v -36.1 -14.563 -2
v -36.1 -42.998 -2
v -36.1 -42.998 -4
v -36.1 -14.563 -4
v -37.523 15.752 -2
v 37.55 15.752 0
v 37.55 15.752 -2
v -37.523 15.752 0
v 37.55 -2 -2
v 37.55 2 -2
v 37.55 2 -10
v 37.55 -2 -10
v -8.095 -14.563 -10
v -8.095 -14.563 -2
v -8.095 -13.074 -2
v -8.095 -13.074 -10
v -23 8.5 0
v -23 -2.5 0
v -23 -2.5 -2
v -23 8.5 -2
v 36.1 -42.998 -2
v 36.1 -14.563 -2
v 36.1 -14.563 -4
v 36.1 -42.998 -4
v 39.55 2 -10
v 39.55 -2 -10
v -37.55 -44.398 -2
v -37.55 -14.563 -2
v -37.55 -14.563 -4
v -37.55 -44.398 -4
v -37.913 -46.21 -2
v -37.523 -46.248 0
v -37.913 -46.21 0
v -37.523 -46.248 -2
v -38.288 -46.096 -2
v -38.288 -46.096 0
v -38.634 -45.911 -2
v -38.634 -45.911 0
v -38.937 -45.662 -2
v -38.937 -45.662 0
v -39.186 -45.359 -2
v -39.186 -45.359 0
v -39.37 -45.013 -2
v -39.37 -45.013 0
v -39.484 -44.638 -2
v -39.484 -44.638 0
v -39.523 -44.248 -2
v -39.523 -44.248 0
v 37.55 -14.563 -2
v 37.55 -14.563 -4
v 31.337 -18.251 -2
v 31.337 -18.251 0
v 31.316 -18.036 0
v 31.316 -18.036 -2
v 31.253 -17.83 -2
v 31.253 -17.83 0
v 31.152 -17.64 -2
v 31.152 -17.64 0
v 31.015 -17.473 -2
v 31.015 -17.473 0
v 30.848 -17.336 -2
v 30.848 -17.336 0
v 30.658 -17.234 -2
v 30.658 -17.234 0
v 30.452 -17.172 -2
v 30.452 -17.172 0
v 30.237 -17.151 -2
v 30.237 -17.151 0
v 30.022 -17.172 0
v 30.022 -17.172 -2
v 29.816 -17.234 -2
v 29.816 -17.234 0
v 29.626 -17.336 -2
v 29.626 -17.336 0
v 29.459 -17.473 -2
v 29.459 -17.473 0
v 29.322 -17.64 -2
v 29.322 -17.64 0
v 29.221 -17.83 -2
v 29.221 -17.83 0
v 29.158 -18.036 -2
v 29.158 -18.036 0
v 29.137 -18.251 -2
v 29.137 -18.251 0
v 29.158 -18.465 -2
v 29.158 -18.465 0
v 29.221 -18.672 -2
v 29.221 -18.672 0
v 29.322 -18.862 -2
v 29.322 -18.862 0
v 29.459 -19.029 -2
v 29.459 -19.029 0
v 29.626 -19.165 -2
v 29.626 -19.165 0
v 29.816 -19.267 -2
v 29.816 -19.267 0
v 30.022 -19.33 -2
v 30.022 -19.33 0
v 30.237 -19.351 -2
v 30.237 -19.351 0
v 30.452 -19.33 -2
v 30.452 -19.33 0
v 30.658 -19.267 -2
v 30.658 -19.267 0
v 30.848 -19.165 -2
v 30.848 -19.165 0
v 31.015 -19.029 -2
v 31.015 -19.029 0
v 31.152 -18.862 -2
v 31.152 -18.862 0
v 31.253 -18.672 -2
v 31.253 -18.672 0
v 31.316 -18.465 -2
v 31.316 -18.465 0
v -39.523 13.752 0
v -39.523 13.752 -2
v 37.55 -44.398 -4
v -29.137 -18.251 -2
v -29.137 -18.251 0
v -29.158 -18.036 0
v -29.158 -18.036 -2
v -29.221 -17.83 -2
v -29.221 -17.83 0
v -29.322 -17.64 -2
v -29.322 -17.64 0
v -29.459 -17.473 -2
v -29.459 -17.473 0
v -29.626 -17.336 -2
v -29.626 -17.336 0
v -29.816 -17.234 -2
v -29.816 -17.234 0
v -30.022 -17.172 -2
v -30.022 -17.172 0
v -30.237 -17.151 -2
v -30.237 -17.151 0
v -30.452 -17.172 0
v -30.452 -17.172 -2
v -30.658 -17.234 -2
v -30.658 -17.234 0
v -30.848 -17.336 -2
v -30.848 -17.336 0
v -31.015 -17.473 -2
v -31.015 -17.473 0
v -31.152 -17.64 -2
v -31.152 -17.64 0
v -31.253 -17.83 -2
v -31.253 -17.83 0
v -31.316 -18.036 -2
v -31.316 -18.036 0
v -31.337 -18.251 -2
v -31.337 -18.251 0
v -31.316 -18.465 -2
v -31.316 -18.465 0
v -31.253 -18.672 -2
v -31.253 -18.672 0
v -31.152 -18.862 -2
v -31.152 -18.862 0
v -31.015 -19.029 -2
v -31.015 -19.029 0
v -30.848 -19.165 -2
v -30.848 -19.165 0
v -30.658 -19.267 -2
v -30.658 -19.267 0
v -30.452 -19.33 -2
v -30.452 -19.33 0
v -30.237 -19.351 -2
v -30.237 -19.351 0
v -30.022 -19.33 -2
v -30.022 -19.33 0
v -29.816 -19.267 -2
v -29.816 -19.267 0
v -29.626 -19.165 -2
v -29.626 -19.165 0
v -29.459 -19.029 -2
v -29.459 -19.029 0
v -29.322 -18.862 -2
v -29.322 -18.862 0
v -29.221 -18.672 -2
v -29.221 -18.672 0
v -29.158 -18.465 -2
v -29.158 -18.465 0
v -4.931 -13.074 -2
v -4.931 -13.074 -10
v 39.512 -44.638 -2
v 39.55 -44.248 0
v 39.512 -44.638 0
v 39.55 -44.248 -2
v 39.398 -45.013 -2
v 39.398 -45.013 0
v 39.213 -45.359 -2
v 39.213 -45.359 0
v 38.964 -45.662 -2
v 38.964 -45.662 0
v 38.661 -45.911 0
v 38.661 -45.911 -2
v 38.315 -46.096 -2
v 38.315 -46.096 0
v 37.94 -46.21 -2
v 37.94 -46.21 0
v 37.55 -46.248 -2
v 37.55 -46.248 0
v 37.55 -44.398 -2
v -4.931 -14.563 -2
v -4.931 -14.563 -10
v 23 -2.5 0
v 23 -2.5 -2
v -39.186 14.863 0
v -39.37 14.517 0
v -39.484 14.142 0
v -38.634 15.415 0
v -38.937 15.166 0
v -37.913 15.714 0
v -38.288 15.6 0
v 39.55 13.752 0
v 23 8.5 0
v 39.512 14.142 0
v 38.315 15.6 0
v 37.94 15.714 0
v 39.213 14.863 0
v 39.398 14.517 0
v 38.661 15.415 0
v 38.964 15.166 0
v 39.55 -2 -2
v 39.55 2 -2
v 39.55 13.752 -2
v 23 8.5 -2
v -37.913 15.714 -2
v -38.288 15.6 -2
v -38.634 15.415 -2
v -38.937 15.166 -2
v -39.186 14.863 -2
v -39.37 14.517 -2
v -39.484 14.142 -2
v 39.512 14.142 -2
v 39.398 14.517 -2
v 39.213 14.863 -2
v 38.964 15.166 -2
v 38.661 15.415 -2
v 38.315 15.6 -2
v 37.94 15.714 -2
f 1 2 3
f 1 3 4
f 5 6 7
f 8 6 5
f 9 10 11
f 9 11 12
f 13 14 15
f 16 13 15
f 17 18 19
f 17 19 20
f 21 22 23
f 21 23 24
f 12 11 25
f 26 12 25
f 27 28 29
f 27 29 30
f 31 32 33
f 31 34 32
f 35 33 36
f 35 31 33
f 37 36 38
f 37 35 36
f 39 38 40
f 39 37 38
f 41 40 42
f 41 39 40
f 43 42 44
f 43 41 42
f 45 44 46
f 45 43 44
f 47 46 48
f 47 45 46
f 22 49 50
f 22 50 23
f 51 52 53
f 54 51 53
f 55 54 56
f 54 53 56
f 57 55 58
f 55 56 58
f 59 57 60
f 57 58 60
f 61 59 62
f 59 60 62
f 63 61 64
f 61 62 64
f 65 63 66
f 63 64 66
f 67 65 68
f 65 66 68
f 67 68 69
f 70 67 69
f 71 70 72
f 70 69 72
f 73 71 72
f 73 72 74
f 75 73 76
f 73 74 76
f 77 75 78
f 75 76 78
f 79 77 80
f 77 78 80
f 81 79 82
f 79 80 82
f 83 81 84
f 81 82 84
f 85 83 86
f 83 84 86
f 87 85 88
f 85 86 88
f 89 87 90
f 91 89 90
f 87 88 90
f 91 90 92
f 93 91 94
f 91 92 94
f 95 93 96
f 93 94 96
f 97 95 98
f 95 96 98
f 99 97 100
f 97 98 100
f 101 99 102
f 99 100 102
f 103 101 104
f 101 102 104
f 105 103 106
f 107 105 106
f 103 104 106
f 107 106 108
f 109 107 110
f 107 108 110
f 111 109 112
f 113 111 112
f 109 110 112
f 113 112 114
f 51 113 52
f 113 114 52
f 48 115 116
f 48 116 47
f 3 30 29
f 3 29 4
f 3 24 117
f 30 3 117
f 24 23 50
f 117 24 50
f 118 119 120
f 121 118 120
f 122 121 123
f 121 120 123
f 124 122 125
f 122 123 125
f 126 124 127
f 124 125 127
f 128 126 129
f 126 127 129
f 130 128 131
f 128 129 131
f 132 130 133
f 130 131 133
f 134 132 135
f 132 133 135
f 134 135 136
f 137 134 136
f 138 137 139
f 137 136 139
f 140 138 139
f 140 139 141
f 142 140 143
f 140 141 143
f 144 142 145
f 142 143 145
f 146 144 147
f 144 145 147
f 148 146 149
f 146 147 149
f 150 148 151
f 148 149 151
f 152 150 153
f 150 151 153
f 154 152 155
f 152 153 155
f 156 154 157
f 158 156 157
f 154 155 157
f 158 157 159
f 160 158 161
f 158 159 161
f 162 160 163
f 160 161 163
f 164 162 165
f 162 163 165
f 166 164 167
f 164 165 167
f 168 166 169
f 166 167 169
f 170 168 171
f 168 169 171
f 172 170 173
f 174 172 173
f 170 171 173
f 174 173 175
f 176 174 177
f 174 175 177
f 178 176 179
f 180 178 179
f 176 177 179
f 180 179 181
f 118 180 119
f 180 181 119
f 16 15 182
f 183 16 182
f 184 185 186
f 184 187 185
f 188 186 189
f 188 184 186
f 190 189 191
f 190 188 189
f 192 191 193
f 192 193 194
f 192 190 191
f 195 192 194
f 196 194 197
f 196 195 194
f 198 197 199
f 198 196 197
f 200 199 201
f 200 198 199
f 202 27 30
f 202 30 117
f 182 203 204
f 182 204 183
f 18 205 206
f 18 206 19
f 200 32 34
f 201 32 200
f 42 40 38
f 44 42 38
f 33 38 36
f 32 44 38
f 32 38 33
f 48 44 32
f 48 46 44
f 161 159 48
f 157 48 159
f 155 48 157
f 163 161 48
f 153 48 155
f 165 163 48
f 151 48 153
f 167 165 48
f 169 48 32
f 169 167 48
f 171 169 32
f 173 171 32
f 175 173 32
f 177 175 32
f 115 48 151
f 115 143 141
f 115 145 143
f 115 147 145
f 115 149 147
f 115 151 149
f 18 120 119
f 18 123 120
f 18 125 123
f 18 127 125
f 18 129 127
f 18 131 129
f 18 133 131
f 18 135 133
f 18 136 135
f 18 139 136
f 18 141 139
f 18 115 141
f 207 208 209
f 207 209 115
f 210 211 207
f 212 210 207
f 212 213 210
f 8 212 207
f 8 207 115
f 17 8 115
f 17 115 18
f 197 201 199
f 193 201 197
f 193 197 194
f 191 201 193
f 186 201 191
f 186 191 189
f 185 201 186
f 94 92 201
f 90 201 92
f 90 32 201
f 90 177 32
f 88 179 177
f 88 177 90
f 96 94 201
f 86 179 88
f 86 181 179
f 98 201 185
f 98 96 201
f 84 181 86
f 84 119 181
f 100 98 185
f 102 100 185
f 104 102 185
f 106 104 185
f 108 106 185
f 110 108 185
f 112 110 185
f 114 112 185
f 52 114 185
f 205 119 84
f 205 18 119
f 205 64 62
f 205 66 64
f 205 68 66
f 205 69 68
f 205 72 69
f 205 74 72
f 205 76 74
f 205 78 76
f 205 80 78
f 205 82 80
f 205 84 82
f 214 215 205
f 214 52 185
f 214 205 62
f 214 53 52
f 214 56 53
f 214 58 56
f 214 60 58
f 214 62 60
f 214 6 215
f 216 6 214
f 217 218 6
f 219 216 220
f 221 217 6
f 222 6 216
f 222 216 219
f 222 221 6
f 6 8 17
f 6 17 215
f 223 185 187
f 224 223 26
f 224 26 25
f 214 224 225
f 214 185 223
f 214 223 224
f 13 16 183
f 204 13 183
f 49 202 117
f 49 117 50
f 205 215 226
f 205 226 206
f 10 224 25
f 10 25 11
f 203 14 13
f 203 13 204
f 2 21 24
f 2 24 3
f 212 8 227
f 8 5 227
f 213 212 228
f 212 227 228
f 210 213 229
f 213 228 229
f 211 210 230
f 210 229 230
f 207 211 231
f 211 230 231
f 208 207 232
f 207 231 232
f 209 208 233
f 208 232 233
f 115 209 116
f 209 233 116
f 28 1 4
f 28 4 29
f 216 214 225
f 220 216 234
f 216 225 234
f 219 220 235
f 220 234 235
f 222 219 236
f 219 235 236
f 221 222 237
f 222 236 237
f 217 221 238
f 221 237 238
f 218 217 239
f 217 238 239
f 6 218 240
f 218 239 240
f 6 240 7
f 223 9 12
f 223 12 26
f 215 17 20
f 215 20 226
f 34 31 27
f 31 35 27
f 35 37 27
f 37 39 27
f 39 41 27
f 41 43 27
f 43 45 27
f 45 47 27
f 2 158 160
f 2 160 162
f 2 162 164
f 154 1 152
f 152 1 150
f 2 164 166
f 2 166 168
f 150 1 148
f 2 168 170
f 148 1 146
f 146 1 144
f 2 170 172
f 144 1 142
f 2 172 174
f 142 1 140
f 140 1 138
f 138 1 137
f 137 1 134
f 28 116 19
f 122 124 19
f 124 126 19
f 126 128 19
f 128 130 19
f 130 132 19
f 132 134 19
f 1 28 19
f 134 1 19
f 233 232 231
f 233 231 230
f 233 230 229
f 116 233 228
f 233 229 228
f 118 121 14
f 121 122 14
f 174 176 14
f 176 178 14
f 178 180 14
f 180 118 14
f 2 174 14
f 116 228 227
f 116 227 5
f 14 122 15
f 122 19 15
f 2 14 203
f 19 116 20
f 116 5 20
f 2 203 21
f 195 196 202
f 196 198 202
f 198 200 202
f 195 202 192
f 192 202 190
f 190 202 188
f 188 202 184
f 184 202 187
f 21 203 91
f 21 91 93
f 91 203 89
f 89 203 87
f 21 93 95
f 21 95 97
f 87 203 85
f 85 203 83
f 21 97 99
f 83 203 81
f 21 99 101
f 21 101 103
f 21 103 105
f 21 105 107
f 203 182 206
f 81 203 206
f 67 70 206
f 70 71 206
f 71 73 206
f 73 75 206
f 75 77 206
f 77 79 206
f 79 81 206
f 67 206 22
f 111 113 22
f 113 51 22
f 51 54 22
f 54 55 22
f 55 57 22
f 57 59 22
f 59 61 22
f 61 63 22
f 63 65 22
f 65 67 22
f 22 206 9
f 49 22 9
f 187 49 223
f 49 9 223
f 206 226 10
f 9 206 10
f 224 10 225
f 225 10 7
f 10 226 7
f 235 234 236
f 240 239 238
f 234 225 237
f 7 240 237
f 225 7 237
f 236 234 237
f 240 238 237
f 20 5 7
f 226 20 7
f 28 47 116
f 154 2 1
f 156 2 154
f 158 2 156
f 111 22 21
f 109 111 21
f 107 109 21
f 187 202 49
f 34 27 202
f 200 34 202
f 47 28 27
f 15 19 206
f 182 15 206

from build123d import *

# Parameters (mm, degrees)
F1_DEPTH = 2
F0_R     = 3
F0_R_2   = 1.1
F2_DEPTH = 2
F0_W     = 3.1642657705
F0_H     = 1.4890261218
F3_DEPTH = 10
F4_DEPTH = 4
F5_R     = 2


with BuildPart() as f1:
    # F0 (on Top) → F1 (new body)
    with BuildSketch(Plane.XY):
        Polygon((-37.55, -13.0740804598), (-37.55, -12.1), (-37.55, 13.5259195402), (37.55, 13.5259195402), (37.55, 2.0000108369), (39.55, 2.0000108369), (39.55, 15.7519578086), (-39.5226512551, 15.7519578086), (-39.5226512551, -46.2480421914), (39.55, -46.2480421914), (39.55, -1.9999891631), (37.55, -1.9999891631), (37.55, -13.0740804598), (-4.9305087887, -13.0740804598), (-4.9305087887, -14.5631065816), (36.1, -14.5631065816), (37.55, -14.5631065816), (37.55, -44.3981406778), (-37.55, -44.3981406778), (-37.55, -14.5631065816), (-36.1, -14.5631065816), (-8.0947745591, -14.5631065816), (-8.0947745591, -13.0740804598), align=None)
    extrude(amount=-F1_DEPTH)

    # F0 (on Top) → F2 (join)
    with BuildSketch(Plane.XY):
        Polygon((-4.9305087887, -14.5631065816), (-8.0947745591, -14.5631065816), (-36.1, -14.5631065816), (-36.1, -42.9981406778), (36.1, -42.9981406778), (36.1, -14.5631065816), align=None)
        with Locations((-30.2370786667, -18.2506926358)):
            Circle(F0_R, mode=Mode.SUBTRACT)
        with Locations((30.2370786667, -18.2506926358)):
            Circle(F0_R, mode=Mode.SUBTRACT)
        Polygon((-37.55, 13.5259195402), (-37.55, -12.1), (-37.55, -13.0740804598), (-8.0947745591, -13.0740804598), (-4.9305087887, -13.0740804598), (37.55, -13.0740804598), (37.55, -1.9999891631), (37.55, 2.0000108369), (37.55, 13.5259195402), align=None)
        Polygon((36.1, 12.1), (36.1, -12.1), (-36.1, -12.1), (-36.1, 12.1), (-25.6, 12.1), (29.1, 12.1), align=None, mode=Mode.SUBTRACT)
        Polygon((-36.1, -12.1), (36.1, -12.1), (36.1, 12.1), (29.1, 12.1), (-25.6, 12.1), (-36.1, 12.1), align=None)
        with BuildLine():
            ThreePointArc((-23, 0.1033370453), (-28.1971127107, 0.0983324043), (-25.6, 4.6))
            ThreePointArc((-25.6, 4.6), (-24.0983324043, 4.1971127107), (-23, 3.0966629547))
            Line((-23, 3.0966629547), (-23, 8.5))
            Line((-23, 8.5), (0, 8.5))
            Line((0, 8.5), (23, 8.5))
            Line((23, 8.5), (23, -2.5))
            Line((23, -2.5), (-23, -2.5))
            Line((-23, -2.5), (-23, 0.1033370453))
        make_face(mode=Mode.SUBTRACT)
        with BuildLine():
            ThreePointArc((32.1000297599, 2.1), (26.978658613, -0.021341387), (29.1, 5.1000297599))
            ThreePointArc((29.1, 5.1000297599), (31.221341387, 4.221341387), (32.1000297599, 2.1))
        make_face(mode=Mode.SUBTRACT)
        Polygon((-36.1, -42.9981406778), (-36.1, -14.5631065816), (-37.55, -14.5631065816), (-37.55, -44.3981406778), (37.55, -44.3981406778), (37.55, -14.5631065816), (36.1, -14.5631065816), (36.1, -42.9981406778), align=None)
        with BuildLine():
            ThreePointArc((32.1000297599, 2.1), (31.221341387, 4.221341387), (29.1, 5.1000297599))
            ThreePointArc((29.1, 5.1000297599), (26.978658613, -0.021341387), (32.1000297599, 2.1))
        make_face()
        with BuildLine():
            ThreePointArc((30.2, 2.1), (28.3221825407, 1.3221825407), (29.1, 3.2))
            ThreePointArc((29.1, 3.2), (29.8778174593, 2.8778174593), (30.2, 2.1))
        make_face(mode=Mode.SUBTRACT)
        with Locations((30.2370786667, -18.2506926358)):
            Circle(F0_R)
        with Locations((30.2370786667, -18.2506926358)):
            Circle(F0_R_2, mode=Mode.SUBTRACT)
        with Locations((-30.2370786667, -18.2506926358)):
            Circle(F0_R)
        with Locations((-30.2370786667, -18.2506926358)):
            Circle(F0_R_2, mode=Mode.SUBTRACT)
        with BuildLine():
            Line((-25.6, 2.7), (-25.6, 4.6))
            ThreePointArc((-25.6, 4.6), (-28.1971127107, 0.0983324043), (-23, 0.1033370453))
            Line((-23, 0.1033370453), (-23, 1.6))
            Line((-23, 1.6), (-24.5, 1.6))
            ThreePointArc((-24.5, 1.6), (-26.3778174593, 0.8221825407), (-25.6, 2.7))
        make_face()
        with BuildLine():
            ThreePointArc((-23, 3.0966629547), (-24.0983324043, 4.1971127107), (-25.6, 4.6))
            Line((-25.6, 4.6), (-25.6, 2.7))
            ThreePointArc((-25.6, 2.7), (-24.8221825407, 2.3778174593), (-24.5, 1.6))
            Line((-24.5, 1.6), (-23, 1.6))
            Line((-23, 1.6), (-23, 3.0966629547))
        make_face()
        with BuildLine():
            ThreePointArc((30.2, 2.1), (29.8778174593, 2.8778174593), (29.1, 3.2))
            ThreePointArc((29.1, 3.2), (28.3221825407, 1.3221825407), (30.2, 2.1))
        make_face()
        with BuildLine():
            Line((-25.6, 1.6), (-25.6, 2.7))
            ThreePointArc((-25.6, 2.7), (-26.3778174593, 0.8221825407), (-24.5, 1.6))
            Line((-24.5, 1.6), (-25.6, 1.6))
        make_face()
        with BuildLine():
            ThreePointArc((-24.5, 1.6), (-24.8221825407, 2.3778174593), (-25.6, 2.7))
            Line((-25.6, 2.7), (-25.6, 1.6))
            Line((-25.6, 1.6), (-24.5, 1.6))
        make_face()
    extrude(amount=-F2_DEPTH)

    # F0 (on Top) → F3 (join)
    with BuildSketch(Plane.XY):
        Polygon((39.55, 2.0000108369), (37.55, 2.0000108369), (37.55, -1.9999891631), (39.55, -1.9999891631), (39.55, 1.08369e-05), align=None)
        with Locations((-6.5126416739, -13.8185935207)):
            Rectangle(F0_W, F0_H)
    extrude(amount=-F3_DEPTH)

    # F0 (on Top) → F4 (join)
    with BuildSketch(Plane.XY):
        Polygon((-36.1, -42.9981406778), (-36.1, -14.5631065816), (-37.55, -14.5631065816), (-37.55, -44.3981406778), (37.55, -44.3981406778), (37.55, -14.5631065816), (36.1, -14.5631065816), (36.1, -42.9981406778), align=None)
    extrude(amount=-F4_DEPTH)

    # F5
    f5_edges = [f1.edges().sort_by_distance(p)[0] for p in [
        (-39.522651, 15.751958, -1),
        (39.55, 15.751958, -1),
        (39.55, -46.248042, -1),
        (-39.522651, -46.248042, -1),
    ]]
    fillet(f5_edges, radius=F5_R)


solid = f1.part
